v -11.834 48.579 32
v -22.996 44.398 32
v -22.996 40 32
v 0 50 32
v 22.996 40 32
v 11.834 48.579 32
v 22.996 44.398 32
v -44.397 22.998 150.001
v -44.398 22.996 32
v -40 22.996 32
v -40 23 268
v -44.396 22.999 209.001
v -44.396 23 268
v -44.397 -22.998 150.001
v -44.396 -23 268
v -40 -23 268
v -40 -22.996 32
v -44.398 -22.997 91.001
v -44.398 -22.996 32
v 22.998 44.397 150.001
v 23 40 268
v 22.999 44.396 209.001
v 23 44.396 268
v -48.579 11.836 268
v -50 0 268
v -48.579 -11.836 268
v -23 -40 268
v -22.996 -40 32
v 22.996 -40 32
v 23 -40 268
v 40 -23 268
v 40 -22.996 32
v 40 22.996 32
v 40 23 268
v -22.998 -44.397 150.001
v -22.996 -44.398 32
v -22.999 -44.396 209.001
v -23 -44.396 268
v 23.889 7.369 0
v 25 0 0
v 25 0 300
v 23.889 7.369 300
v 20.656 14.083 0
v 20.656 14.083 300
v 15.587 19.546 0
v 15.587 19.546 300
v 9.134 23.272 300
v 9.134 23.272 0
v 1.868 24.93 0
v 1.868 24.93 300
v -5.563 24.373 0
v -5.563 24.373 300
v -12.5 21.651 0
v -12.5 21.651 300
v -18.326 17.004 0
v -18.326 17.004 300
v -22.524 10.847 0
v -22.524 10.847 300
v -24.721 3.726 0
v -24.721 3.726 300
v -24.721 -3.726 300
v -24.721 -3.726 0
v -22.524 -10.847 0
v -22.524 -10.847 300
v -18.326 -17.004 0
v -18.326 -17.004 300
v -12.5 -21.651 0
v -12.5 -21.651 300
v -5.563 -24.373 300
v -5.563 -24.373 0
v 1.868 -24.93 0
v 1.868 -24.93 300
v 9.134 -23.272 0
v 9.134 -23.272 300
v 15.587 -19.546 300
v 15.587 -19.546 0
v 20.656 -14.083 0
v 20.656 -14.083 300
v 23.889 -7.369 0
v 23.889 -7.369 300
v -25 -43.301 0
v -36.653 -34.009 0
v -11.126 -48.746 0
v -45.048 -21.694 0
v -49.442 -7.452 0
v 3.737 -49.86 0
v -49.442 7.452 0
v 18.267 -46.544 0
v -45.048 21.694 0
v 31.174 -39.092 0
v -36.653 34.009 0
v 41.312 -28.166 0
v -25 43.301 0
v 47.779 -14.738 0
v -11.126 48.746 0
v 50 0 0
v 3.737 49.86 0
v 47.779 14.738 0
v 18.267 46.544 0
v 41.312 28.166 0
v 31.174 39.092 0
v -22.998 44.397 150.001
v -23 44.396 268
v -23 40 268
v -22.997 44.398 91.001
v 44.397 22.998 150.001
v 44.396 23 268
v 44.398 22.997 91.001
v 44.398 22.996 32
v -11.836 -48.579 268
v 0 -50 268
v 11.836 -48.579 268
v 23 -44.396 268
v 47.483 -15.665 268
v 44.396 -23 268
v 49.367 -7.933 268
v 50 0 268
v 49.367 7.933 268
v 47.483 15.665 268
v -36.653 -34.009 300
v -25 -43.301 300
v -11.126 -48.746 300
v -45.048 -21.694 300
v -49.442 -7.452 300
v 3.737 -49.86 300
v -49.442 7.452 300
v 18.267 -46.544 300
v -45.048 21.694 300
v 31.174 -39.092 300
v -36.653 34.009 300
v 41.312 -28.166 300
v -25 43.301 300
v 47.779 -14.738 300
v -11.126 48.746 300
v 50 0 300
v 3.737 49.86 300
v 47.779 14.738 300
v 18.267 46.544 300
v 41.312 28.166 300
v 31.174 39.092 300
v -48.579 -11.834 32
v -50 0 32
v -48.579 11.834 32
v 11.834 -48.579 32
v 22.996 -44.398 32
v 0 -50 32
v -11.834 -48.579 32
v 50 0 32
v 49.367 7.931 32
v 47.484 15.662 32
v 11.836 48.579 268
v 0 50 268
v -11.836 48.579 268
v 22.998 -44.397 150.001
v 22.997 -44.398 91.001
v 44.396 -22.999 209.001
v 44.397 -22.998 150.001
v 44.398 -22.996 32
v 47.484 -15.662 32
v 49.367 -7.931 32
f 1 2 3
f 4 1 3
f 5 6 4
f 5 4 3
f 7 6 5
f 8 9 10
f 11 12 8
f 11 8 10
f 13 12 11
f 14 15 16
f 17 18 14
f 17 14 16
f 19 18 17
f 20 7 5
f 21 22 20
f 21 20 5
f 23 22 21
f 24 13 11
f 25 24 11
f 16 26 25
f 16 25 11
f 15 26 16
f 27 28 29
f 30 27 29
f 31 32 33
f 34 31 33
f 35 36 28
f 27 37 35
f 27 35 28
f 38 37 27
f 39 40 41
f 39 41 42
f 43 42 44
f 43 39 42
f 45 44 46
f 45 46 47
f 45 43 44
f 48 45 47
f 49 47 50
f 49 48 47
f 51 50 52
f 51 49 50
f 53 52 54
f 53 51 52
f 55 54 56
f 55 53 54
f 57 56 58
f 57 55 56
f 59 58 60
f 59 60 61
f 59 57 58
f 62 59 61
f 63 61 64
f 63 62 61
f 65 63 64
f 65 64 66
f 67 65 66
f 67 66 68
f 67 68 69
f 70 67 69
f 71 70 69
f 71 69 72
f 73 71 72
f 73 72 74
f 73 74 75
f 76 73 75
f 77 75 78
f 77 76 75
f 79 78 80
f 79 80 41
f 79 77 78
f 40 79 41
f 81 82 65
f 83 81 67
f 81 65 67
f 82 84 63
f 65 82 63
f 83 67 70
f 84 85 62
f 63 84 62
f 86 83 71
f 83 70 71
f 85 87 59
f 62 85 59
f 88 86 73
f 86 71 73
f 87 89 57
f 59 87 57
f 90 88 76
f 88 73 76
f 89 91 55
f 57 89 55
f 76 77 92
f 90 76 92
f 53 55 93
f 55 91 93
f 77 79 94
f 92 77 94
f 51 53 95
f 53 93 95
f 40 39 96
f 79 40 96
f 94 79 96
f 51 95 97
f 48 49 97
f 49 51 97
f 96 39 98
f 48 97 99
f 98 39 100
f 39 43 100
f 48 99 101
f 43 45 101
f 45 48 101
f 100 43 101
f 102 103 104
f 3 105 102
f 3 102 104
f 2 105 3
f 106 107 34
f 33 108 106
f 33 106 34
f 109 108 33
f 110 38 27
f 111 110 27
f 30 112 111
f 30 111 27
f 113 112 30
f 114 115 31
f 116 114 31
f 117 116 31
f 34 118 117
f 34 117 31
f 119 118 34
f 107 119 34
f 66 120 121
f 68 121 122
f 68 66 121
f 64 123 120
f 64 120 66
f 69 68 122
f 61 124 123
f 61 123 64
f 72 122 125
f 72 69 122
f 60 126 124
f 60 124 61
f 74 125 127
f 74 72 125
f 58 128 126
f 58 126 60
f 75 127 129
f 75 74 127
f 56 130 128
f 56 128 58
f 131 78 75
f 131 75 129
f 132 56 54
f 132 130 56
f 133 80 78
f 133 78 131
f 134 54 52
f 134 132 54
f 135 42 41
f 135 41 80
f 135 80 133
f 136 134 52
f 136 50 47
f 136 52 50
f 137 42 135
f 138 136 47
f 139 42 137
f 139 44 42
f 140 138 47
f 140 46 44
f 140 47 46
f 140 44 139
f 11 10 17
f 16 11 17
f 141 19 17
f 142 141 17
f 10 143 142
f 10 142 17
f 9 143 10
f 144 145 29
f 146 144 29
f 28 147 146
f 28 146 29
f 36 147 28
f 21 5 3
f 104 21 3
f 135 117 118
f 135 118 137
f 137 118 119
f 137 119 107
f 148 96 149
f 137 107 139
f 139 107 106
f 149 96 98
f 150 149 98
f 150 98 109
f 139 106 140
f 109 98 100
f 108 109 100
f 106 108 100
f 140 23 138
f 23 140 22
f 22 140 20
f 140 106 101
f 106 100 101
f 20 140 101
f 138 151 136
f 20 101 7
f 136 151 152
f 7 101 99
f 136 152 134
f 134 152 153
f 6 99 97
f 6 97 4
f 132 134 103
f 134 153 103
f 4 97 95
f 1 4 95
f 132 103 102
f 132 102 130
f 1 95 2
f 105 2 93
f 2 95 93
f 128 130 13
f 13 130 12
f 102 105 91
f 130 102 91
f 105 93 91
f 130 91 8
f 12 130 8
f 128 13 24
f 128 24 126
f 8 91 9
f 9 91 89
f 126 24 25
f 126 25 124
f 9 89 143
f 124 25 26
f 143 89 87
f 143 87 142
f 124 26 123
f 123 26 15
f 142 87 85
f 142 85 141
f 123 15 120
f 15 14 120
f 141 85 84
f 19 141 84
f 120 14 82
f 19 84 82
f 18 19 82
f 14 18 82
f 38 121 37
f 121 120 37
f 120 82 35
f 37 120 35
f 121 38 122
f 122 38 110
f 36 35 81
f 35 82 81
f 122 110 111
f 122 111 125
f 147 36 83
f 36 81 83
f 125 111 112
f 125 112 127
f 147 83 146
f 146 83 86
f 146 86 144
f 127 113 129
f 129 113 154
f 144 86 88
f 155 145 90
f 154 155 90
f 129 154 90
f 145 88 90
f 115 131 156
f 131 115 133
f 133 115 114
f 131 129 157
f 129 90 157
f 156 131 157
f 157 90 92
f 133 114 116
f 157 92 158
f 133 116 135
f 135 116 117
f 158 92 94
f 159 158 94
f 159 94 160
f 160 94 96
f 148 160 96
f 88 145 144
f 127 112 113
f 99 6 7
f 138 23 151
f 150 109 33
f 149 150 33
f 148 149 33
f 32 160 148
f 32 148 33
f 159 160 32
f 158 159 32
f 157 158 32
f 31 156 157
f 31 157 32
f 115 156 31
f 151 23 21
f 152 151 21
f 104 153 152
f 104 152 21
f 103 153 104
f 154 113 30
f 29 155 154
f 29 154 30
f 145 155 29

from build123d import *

# Parameters (mm, degrees)
SKETCH1_R           = 50
SKETCH1_R_2         = 25
BOSS_EXTRUDE1_DEPTH = 300
CUT_EXTRUDE1_DEPTH  = 10
CIRPATTERN1_COUNT   = 4


with BuildPart() as part:
    # Sketch1 → Boss-Extrude1 (new body)
    with BuildSketch(Plane.XY):
        Circle(SKETCH1_R)
        Circle(SKETCH1_R_2, mode=Mode.SUBTRACT)
    extrude(amount=BOSS_EXTRUDE1_DEPTH)

    # Sketch2 → Cut-Extrude1 (cut)
    with BuildSketch(Plane(origin=(0, 50, 0), x_dir=(1, 0, 0), z_dir=(0, 1, 0))):
        Polygon((-22.999966335, -268), (-22.995993926, -32), (22.995993926, -32), (22.999966335, -268), align=None)
    cut_extrude1 = extrude(amount=-CUT_EXTRUDE1_DEPTH, mode=Mode.SUBTRACT)

    # CirPattern1: Cut-Extrude1 ×4 about axis
    cirpattern1_axis = Axis((0, 0, 0), (0, 0, 1))
    for i in range(1, CIRPATTERN1_COUNT):
        add(cut_extrude1.rotate(cirpattern1_axis, i * 360 / CIRPATTERN1_COUNT), mode=Mode.SUBTRACT)


solid = part.part
